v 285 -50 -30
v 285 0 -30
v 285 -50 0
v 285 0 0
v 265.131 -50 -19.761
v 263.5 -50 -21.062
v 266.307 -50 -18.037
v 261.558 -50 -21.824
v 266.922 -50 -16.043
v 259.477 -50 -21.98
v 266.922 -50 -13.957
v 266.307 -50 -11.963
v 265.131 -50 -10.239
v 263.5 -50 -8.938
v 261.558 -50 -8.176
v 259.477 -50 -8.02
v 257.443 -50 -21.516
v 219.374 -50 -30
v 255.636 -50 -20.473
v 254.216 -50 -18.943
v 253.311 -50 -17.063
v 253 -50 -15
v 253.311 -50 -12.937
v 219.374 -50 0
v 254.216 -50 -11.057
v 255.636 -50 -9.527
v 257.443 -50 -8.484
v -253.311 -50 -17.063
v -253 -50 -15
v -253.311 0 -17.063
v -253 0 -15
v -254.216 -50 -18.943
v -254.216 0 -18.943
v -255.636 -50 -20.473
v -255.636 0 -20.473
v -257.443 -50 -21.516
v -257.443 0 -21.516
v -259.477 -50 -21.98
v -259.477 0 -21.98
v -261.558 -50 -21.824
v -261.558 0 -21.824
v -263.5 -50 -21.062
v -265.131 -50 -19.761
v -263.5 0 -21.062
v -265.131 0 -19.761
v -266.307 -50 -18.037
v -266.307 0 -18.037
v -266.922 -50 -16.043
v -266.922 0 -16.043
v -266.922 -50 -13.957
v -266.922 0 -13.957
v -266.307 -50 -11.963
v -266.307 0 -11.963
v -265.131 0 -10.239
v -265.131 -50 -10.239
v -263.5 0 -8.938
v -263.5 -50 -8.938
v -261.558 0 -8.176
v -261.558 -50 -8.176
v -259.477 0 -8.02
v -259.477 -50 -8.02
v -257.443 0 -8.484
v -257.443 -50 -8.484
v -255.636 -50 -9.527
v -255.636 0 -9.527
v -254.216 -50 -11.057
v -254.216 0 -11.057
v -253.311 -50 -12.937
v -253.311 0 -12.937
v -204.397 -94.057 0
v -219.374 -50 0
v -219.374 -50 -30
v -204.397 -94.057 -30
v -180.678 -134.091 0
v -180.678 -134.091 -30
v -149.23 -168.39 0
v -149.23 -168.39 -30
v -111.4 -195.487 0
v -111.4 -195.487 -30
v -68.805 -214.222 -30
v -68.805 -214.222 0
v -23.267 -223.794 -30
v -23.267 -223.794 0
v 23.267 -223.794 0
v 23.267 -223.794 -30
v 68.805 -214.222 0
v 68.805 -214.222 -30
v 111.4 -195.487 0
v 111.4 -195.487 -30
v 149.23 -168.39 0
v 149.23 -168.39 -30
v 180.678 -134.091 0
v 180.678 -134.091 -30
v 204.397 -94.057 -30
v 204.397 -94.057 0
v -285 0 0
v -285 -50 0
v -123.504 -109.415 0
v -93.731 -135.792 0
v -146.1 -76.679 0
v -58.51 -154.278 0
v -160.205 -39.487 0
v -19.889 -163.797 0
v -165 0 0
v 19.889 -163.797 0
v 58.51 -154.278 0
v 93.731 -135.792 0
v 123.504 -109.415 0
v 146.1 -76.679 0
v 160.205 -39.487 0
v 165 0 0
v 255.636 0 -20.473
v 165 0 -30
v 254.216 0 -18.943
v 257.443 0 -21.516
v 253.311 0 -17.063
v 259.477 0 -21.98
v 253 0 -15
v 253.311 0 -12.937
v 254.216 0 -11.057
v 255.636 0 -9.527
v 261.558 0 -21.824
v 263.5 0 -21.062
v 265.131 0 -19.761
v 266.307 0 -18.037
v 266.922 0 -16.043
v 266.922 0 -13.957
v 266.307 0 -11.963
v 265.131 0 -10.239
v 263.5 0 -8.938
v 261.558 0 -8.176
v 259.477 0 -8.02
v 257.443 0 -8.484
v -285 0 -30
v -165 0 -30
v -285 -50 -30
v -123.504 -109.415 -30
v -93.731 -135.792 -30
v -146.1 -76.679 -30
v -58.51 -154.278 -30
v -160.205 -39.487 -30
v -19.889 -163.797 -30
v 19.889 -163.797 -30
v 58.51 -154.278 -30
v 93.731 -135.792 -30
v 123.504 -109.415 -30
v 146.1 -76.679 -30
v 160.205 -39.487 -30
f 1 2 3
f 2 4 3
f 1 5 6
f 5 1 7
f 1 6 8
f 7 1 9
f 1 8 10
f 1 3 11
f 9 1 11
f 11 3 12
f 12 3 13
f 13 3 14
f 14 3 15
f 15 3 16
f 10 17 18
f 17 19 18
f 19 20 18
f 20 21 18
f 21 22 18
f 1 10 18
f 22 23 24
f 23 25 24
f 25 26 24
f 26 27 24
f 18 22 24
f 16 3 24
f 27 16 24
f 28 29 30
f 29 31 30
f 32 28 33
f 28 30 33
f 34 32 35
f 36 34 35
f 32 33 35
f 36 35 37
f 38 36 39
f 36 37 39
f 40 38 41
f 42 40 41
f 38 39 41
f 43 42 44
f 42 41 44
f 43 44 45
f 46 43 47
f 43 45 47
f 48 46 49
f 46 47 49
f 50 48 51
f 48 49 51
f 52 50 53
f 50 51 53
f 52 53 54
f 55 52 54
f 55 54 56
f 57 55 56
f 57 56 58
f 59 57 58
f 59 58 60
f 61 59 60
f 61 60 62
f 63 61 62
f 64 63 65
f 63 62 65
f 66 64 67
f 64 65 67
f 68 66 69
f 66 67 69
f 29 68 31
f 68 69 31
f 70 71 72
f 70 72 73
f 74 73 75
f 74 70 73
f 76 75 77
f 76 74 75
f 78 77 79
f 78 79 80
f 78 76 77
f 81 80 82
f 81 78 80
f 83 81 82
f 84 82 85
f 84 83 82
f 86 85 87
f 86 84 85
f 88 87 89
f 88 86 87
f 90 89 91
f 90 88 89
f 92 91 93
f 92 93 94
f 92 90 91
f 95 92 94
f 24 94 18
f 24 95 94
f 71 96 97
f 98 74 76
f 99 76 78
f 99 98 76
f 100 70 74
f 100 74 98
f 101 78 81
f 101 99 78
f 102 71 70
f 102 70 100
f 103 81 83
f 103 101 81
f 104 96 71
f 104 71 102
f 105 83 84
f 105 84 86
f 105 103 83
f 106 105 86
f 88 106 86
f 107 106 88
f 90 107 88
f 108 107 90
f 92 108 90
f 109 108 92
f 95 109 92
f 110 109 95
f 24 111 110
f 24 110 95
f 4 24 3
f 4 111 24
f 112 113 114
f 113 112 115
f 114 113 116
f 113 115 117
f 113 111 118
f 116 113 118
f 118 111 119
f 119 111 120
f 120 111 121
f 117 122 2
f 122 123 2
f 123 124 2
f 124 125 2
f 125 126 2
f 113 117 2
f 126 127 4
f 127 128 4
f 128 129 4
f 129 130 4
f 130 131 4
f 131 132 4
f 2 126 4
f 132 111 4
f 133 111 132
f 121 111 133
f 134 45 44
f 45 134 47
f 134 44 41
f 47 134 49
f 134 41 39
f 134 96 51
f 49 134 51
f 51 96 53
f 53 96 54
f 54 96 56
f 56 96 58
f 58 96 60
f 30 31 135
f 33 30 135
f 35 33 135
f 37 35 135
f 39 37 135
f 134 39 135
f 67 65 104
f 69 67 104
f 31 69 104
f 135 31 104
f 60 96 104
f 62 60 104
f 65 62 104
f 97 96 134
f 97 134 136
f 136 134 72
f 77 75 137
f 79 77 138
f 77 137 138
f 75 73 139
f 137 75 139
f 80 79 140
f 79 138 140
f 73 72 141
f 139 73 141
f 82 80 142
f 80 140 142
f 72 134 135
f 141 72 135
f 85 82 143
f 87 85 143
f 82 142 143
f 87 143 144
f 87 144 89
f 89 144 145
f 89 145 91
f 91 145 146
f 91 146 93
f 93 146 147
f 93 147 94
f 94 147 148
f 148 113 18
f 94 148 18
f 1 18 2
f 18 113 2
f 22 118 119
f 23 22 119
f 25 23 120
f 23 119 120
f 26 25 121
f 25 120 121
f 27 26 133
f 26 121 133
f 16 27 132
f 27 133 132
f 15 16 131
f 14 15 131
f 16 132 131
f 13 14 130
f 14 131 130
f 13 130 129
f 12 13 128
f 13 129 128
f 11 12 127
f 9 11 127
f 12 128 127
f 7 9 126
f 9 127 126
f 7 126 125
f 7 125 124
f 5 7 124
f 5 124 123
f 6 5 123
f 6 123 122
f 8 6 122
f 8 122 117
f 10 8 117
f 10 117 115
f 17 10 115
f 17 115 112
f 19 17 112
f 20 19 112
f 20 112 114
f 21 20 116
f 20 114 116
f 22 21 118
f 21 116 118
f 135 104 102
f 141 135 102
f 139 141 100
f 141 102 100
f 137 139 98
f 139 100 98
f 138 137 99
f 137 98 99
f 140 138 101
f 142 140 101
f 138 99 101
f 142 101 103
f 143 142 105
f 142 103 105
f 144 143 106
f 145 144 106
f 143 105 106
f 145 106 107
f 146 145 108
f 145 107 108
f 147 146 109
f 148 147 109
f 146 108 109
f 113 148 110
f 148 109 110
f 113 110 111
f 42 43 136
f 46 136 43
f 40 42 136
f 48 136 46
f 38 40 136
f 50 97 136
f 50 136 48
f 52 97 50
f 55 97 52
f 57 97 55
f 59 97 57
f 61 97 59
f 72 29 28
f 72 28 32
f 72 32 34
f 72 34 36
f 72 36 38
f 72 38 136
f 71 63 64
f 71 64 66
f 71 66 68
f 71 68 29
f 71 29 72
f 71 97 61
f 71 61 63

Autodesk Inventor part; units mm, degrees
ref_plane "YZ Plane" through (0, 0, 0) normal (1, 0, 0) x (0, 1, 0)
ref_plane "XZ Plane" through (0, 0, 0) normal (0, 1, 0) x (-1, 0, 0)
ref_plane "XY Plane" through (0, 0, 0) normal (0, 0, 1) x (1, 0, 0)
sketch "Sketch1" plane through (0, 0, 0) normal (0, 0, 1) x (1, 0, 0)
  circle A0 centre (0, 0) radius 195 construction
  line L0 (0, 195) -> (0, 225) construction
  line L1 (0, 195) -> (0, 165) construction
  circle A1 centre (0, 0) radius 165
  circle A2 centre (0, 0) radius 225
  line L2 (-165, 0) -> (-165, 80)
  line L3 (-165, 80) -> (-225, 80)
  line L4 (-225, 80) -> (-225, 0)
  line L5 (165, 0) -> (165, 80)
  line L6 (165, 80) -> (225, 80)
  line L7 (225, 80) -> (225, 0)
  line L8 (-225, 0) -> (-165, 0)
  line L9 (165, 0) -> (225, 0)
  line L10 (-225, 0) -> (-285, 0)
  line L11 (-285, 0) -> (-285, -50)
  line L12 (-285, -50) -> (-219.3741, -50)
  line L13 (225, 0) -> (285, 0)
  line L14 (285, 0) -> (285, -50)
  line L15 (285, -50) -> (219.3741, -50)
  dimension "d13" = 390
  dimension "d26" = 80
  dimension "d36" = 60
  dimension "d40" = 60
  dimension "d41" = 50
extrude "Extrusion1" add sketch "Sketch1" against normal blind 30 contours L9 A2 L8 A1 | L13 L14 L15 A2 | A2 L12 L11 L10
sketch "Sketch7" plane through (-285, 0, 0) normal (0, 1, 0) x (1, 0, 0)
  circle A0 centre (25, 15) radius 7
  line L0 (0, 0) -> (0, 30) projected
  point P0 (285, 0)
  point P1 (0, 15)
  dimension "d42" = 14
  dimension "d43" = 25
extrude "Extrusion7" cut sketch "Sketch7" against normal through all
mirror "Mirror1" about plane through (0, 0, 0) normal (1, 0, 0) of "Extrusion7"
equation "\"d13\" = Шпил_пласт_НОС_диам_центров"
equation "\"d40\" = d36"
equation "\"BendReliefDepth\" = 0.5 * Thickness"
equation "\"Шпил_пласт_НОС_диам_центров\" = 390"
equation "\"Thickness\" = 30"
properties part number "ДМФ 092 Коромысло НОС"
